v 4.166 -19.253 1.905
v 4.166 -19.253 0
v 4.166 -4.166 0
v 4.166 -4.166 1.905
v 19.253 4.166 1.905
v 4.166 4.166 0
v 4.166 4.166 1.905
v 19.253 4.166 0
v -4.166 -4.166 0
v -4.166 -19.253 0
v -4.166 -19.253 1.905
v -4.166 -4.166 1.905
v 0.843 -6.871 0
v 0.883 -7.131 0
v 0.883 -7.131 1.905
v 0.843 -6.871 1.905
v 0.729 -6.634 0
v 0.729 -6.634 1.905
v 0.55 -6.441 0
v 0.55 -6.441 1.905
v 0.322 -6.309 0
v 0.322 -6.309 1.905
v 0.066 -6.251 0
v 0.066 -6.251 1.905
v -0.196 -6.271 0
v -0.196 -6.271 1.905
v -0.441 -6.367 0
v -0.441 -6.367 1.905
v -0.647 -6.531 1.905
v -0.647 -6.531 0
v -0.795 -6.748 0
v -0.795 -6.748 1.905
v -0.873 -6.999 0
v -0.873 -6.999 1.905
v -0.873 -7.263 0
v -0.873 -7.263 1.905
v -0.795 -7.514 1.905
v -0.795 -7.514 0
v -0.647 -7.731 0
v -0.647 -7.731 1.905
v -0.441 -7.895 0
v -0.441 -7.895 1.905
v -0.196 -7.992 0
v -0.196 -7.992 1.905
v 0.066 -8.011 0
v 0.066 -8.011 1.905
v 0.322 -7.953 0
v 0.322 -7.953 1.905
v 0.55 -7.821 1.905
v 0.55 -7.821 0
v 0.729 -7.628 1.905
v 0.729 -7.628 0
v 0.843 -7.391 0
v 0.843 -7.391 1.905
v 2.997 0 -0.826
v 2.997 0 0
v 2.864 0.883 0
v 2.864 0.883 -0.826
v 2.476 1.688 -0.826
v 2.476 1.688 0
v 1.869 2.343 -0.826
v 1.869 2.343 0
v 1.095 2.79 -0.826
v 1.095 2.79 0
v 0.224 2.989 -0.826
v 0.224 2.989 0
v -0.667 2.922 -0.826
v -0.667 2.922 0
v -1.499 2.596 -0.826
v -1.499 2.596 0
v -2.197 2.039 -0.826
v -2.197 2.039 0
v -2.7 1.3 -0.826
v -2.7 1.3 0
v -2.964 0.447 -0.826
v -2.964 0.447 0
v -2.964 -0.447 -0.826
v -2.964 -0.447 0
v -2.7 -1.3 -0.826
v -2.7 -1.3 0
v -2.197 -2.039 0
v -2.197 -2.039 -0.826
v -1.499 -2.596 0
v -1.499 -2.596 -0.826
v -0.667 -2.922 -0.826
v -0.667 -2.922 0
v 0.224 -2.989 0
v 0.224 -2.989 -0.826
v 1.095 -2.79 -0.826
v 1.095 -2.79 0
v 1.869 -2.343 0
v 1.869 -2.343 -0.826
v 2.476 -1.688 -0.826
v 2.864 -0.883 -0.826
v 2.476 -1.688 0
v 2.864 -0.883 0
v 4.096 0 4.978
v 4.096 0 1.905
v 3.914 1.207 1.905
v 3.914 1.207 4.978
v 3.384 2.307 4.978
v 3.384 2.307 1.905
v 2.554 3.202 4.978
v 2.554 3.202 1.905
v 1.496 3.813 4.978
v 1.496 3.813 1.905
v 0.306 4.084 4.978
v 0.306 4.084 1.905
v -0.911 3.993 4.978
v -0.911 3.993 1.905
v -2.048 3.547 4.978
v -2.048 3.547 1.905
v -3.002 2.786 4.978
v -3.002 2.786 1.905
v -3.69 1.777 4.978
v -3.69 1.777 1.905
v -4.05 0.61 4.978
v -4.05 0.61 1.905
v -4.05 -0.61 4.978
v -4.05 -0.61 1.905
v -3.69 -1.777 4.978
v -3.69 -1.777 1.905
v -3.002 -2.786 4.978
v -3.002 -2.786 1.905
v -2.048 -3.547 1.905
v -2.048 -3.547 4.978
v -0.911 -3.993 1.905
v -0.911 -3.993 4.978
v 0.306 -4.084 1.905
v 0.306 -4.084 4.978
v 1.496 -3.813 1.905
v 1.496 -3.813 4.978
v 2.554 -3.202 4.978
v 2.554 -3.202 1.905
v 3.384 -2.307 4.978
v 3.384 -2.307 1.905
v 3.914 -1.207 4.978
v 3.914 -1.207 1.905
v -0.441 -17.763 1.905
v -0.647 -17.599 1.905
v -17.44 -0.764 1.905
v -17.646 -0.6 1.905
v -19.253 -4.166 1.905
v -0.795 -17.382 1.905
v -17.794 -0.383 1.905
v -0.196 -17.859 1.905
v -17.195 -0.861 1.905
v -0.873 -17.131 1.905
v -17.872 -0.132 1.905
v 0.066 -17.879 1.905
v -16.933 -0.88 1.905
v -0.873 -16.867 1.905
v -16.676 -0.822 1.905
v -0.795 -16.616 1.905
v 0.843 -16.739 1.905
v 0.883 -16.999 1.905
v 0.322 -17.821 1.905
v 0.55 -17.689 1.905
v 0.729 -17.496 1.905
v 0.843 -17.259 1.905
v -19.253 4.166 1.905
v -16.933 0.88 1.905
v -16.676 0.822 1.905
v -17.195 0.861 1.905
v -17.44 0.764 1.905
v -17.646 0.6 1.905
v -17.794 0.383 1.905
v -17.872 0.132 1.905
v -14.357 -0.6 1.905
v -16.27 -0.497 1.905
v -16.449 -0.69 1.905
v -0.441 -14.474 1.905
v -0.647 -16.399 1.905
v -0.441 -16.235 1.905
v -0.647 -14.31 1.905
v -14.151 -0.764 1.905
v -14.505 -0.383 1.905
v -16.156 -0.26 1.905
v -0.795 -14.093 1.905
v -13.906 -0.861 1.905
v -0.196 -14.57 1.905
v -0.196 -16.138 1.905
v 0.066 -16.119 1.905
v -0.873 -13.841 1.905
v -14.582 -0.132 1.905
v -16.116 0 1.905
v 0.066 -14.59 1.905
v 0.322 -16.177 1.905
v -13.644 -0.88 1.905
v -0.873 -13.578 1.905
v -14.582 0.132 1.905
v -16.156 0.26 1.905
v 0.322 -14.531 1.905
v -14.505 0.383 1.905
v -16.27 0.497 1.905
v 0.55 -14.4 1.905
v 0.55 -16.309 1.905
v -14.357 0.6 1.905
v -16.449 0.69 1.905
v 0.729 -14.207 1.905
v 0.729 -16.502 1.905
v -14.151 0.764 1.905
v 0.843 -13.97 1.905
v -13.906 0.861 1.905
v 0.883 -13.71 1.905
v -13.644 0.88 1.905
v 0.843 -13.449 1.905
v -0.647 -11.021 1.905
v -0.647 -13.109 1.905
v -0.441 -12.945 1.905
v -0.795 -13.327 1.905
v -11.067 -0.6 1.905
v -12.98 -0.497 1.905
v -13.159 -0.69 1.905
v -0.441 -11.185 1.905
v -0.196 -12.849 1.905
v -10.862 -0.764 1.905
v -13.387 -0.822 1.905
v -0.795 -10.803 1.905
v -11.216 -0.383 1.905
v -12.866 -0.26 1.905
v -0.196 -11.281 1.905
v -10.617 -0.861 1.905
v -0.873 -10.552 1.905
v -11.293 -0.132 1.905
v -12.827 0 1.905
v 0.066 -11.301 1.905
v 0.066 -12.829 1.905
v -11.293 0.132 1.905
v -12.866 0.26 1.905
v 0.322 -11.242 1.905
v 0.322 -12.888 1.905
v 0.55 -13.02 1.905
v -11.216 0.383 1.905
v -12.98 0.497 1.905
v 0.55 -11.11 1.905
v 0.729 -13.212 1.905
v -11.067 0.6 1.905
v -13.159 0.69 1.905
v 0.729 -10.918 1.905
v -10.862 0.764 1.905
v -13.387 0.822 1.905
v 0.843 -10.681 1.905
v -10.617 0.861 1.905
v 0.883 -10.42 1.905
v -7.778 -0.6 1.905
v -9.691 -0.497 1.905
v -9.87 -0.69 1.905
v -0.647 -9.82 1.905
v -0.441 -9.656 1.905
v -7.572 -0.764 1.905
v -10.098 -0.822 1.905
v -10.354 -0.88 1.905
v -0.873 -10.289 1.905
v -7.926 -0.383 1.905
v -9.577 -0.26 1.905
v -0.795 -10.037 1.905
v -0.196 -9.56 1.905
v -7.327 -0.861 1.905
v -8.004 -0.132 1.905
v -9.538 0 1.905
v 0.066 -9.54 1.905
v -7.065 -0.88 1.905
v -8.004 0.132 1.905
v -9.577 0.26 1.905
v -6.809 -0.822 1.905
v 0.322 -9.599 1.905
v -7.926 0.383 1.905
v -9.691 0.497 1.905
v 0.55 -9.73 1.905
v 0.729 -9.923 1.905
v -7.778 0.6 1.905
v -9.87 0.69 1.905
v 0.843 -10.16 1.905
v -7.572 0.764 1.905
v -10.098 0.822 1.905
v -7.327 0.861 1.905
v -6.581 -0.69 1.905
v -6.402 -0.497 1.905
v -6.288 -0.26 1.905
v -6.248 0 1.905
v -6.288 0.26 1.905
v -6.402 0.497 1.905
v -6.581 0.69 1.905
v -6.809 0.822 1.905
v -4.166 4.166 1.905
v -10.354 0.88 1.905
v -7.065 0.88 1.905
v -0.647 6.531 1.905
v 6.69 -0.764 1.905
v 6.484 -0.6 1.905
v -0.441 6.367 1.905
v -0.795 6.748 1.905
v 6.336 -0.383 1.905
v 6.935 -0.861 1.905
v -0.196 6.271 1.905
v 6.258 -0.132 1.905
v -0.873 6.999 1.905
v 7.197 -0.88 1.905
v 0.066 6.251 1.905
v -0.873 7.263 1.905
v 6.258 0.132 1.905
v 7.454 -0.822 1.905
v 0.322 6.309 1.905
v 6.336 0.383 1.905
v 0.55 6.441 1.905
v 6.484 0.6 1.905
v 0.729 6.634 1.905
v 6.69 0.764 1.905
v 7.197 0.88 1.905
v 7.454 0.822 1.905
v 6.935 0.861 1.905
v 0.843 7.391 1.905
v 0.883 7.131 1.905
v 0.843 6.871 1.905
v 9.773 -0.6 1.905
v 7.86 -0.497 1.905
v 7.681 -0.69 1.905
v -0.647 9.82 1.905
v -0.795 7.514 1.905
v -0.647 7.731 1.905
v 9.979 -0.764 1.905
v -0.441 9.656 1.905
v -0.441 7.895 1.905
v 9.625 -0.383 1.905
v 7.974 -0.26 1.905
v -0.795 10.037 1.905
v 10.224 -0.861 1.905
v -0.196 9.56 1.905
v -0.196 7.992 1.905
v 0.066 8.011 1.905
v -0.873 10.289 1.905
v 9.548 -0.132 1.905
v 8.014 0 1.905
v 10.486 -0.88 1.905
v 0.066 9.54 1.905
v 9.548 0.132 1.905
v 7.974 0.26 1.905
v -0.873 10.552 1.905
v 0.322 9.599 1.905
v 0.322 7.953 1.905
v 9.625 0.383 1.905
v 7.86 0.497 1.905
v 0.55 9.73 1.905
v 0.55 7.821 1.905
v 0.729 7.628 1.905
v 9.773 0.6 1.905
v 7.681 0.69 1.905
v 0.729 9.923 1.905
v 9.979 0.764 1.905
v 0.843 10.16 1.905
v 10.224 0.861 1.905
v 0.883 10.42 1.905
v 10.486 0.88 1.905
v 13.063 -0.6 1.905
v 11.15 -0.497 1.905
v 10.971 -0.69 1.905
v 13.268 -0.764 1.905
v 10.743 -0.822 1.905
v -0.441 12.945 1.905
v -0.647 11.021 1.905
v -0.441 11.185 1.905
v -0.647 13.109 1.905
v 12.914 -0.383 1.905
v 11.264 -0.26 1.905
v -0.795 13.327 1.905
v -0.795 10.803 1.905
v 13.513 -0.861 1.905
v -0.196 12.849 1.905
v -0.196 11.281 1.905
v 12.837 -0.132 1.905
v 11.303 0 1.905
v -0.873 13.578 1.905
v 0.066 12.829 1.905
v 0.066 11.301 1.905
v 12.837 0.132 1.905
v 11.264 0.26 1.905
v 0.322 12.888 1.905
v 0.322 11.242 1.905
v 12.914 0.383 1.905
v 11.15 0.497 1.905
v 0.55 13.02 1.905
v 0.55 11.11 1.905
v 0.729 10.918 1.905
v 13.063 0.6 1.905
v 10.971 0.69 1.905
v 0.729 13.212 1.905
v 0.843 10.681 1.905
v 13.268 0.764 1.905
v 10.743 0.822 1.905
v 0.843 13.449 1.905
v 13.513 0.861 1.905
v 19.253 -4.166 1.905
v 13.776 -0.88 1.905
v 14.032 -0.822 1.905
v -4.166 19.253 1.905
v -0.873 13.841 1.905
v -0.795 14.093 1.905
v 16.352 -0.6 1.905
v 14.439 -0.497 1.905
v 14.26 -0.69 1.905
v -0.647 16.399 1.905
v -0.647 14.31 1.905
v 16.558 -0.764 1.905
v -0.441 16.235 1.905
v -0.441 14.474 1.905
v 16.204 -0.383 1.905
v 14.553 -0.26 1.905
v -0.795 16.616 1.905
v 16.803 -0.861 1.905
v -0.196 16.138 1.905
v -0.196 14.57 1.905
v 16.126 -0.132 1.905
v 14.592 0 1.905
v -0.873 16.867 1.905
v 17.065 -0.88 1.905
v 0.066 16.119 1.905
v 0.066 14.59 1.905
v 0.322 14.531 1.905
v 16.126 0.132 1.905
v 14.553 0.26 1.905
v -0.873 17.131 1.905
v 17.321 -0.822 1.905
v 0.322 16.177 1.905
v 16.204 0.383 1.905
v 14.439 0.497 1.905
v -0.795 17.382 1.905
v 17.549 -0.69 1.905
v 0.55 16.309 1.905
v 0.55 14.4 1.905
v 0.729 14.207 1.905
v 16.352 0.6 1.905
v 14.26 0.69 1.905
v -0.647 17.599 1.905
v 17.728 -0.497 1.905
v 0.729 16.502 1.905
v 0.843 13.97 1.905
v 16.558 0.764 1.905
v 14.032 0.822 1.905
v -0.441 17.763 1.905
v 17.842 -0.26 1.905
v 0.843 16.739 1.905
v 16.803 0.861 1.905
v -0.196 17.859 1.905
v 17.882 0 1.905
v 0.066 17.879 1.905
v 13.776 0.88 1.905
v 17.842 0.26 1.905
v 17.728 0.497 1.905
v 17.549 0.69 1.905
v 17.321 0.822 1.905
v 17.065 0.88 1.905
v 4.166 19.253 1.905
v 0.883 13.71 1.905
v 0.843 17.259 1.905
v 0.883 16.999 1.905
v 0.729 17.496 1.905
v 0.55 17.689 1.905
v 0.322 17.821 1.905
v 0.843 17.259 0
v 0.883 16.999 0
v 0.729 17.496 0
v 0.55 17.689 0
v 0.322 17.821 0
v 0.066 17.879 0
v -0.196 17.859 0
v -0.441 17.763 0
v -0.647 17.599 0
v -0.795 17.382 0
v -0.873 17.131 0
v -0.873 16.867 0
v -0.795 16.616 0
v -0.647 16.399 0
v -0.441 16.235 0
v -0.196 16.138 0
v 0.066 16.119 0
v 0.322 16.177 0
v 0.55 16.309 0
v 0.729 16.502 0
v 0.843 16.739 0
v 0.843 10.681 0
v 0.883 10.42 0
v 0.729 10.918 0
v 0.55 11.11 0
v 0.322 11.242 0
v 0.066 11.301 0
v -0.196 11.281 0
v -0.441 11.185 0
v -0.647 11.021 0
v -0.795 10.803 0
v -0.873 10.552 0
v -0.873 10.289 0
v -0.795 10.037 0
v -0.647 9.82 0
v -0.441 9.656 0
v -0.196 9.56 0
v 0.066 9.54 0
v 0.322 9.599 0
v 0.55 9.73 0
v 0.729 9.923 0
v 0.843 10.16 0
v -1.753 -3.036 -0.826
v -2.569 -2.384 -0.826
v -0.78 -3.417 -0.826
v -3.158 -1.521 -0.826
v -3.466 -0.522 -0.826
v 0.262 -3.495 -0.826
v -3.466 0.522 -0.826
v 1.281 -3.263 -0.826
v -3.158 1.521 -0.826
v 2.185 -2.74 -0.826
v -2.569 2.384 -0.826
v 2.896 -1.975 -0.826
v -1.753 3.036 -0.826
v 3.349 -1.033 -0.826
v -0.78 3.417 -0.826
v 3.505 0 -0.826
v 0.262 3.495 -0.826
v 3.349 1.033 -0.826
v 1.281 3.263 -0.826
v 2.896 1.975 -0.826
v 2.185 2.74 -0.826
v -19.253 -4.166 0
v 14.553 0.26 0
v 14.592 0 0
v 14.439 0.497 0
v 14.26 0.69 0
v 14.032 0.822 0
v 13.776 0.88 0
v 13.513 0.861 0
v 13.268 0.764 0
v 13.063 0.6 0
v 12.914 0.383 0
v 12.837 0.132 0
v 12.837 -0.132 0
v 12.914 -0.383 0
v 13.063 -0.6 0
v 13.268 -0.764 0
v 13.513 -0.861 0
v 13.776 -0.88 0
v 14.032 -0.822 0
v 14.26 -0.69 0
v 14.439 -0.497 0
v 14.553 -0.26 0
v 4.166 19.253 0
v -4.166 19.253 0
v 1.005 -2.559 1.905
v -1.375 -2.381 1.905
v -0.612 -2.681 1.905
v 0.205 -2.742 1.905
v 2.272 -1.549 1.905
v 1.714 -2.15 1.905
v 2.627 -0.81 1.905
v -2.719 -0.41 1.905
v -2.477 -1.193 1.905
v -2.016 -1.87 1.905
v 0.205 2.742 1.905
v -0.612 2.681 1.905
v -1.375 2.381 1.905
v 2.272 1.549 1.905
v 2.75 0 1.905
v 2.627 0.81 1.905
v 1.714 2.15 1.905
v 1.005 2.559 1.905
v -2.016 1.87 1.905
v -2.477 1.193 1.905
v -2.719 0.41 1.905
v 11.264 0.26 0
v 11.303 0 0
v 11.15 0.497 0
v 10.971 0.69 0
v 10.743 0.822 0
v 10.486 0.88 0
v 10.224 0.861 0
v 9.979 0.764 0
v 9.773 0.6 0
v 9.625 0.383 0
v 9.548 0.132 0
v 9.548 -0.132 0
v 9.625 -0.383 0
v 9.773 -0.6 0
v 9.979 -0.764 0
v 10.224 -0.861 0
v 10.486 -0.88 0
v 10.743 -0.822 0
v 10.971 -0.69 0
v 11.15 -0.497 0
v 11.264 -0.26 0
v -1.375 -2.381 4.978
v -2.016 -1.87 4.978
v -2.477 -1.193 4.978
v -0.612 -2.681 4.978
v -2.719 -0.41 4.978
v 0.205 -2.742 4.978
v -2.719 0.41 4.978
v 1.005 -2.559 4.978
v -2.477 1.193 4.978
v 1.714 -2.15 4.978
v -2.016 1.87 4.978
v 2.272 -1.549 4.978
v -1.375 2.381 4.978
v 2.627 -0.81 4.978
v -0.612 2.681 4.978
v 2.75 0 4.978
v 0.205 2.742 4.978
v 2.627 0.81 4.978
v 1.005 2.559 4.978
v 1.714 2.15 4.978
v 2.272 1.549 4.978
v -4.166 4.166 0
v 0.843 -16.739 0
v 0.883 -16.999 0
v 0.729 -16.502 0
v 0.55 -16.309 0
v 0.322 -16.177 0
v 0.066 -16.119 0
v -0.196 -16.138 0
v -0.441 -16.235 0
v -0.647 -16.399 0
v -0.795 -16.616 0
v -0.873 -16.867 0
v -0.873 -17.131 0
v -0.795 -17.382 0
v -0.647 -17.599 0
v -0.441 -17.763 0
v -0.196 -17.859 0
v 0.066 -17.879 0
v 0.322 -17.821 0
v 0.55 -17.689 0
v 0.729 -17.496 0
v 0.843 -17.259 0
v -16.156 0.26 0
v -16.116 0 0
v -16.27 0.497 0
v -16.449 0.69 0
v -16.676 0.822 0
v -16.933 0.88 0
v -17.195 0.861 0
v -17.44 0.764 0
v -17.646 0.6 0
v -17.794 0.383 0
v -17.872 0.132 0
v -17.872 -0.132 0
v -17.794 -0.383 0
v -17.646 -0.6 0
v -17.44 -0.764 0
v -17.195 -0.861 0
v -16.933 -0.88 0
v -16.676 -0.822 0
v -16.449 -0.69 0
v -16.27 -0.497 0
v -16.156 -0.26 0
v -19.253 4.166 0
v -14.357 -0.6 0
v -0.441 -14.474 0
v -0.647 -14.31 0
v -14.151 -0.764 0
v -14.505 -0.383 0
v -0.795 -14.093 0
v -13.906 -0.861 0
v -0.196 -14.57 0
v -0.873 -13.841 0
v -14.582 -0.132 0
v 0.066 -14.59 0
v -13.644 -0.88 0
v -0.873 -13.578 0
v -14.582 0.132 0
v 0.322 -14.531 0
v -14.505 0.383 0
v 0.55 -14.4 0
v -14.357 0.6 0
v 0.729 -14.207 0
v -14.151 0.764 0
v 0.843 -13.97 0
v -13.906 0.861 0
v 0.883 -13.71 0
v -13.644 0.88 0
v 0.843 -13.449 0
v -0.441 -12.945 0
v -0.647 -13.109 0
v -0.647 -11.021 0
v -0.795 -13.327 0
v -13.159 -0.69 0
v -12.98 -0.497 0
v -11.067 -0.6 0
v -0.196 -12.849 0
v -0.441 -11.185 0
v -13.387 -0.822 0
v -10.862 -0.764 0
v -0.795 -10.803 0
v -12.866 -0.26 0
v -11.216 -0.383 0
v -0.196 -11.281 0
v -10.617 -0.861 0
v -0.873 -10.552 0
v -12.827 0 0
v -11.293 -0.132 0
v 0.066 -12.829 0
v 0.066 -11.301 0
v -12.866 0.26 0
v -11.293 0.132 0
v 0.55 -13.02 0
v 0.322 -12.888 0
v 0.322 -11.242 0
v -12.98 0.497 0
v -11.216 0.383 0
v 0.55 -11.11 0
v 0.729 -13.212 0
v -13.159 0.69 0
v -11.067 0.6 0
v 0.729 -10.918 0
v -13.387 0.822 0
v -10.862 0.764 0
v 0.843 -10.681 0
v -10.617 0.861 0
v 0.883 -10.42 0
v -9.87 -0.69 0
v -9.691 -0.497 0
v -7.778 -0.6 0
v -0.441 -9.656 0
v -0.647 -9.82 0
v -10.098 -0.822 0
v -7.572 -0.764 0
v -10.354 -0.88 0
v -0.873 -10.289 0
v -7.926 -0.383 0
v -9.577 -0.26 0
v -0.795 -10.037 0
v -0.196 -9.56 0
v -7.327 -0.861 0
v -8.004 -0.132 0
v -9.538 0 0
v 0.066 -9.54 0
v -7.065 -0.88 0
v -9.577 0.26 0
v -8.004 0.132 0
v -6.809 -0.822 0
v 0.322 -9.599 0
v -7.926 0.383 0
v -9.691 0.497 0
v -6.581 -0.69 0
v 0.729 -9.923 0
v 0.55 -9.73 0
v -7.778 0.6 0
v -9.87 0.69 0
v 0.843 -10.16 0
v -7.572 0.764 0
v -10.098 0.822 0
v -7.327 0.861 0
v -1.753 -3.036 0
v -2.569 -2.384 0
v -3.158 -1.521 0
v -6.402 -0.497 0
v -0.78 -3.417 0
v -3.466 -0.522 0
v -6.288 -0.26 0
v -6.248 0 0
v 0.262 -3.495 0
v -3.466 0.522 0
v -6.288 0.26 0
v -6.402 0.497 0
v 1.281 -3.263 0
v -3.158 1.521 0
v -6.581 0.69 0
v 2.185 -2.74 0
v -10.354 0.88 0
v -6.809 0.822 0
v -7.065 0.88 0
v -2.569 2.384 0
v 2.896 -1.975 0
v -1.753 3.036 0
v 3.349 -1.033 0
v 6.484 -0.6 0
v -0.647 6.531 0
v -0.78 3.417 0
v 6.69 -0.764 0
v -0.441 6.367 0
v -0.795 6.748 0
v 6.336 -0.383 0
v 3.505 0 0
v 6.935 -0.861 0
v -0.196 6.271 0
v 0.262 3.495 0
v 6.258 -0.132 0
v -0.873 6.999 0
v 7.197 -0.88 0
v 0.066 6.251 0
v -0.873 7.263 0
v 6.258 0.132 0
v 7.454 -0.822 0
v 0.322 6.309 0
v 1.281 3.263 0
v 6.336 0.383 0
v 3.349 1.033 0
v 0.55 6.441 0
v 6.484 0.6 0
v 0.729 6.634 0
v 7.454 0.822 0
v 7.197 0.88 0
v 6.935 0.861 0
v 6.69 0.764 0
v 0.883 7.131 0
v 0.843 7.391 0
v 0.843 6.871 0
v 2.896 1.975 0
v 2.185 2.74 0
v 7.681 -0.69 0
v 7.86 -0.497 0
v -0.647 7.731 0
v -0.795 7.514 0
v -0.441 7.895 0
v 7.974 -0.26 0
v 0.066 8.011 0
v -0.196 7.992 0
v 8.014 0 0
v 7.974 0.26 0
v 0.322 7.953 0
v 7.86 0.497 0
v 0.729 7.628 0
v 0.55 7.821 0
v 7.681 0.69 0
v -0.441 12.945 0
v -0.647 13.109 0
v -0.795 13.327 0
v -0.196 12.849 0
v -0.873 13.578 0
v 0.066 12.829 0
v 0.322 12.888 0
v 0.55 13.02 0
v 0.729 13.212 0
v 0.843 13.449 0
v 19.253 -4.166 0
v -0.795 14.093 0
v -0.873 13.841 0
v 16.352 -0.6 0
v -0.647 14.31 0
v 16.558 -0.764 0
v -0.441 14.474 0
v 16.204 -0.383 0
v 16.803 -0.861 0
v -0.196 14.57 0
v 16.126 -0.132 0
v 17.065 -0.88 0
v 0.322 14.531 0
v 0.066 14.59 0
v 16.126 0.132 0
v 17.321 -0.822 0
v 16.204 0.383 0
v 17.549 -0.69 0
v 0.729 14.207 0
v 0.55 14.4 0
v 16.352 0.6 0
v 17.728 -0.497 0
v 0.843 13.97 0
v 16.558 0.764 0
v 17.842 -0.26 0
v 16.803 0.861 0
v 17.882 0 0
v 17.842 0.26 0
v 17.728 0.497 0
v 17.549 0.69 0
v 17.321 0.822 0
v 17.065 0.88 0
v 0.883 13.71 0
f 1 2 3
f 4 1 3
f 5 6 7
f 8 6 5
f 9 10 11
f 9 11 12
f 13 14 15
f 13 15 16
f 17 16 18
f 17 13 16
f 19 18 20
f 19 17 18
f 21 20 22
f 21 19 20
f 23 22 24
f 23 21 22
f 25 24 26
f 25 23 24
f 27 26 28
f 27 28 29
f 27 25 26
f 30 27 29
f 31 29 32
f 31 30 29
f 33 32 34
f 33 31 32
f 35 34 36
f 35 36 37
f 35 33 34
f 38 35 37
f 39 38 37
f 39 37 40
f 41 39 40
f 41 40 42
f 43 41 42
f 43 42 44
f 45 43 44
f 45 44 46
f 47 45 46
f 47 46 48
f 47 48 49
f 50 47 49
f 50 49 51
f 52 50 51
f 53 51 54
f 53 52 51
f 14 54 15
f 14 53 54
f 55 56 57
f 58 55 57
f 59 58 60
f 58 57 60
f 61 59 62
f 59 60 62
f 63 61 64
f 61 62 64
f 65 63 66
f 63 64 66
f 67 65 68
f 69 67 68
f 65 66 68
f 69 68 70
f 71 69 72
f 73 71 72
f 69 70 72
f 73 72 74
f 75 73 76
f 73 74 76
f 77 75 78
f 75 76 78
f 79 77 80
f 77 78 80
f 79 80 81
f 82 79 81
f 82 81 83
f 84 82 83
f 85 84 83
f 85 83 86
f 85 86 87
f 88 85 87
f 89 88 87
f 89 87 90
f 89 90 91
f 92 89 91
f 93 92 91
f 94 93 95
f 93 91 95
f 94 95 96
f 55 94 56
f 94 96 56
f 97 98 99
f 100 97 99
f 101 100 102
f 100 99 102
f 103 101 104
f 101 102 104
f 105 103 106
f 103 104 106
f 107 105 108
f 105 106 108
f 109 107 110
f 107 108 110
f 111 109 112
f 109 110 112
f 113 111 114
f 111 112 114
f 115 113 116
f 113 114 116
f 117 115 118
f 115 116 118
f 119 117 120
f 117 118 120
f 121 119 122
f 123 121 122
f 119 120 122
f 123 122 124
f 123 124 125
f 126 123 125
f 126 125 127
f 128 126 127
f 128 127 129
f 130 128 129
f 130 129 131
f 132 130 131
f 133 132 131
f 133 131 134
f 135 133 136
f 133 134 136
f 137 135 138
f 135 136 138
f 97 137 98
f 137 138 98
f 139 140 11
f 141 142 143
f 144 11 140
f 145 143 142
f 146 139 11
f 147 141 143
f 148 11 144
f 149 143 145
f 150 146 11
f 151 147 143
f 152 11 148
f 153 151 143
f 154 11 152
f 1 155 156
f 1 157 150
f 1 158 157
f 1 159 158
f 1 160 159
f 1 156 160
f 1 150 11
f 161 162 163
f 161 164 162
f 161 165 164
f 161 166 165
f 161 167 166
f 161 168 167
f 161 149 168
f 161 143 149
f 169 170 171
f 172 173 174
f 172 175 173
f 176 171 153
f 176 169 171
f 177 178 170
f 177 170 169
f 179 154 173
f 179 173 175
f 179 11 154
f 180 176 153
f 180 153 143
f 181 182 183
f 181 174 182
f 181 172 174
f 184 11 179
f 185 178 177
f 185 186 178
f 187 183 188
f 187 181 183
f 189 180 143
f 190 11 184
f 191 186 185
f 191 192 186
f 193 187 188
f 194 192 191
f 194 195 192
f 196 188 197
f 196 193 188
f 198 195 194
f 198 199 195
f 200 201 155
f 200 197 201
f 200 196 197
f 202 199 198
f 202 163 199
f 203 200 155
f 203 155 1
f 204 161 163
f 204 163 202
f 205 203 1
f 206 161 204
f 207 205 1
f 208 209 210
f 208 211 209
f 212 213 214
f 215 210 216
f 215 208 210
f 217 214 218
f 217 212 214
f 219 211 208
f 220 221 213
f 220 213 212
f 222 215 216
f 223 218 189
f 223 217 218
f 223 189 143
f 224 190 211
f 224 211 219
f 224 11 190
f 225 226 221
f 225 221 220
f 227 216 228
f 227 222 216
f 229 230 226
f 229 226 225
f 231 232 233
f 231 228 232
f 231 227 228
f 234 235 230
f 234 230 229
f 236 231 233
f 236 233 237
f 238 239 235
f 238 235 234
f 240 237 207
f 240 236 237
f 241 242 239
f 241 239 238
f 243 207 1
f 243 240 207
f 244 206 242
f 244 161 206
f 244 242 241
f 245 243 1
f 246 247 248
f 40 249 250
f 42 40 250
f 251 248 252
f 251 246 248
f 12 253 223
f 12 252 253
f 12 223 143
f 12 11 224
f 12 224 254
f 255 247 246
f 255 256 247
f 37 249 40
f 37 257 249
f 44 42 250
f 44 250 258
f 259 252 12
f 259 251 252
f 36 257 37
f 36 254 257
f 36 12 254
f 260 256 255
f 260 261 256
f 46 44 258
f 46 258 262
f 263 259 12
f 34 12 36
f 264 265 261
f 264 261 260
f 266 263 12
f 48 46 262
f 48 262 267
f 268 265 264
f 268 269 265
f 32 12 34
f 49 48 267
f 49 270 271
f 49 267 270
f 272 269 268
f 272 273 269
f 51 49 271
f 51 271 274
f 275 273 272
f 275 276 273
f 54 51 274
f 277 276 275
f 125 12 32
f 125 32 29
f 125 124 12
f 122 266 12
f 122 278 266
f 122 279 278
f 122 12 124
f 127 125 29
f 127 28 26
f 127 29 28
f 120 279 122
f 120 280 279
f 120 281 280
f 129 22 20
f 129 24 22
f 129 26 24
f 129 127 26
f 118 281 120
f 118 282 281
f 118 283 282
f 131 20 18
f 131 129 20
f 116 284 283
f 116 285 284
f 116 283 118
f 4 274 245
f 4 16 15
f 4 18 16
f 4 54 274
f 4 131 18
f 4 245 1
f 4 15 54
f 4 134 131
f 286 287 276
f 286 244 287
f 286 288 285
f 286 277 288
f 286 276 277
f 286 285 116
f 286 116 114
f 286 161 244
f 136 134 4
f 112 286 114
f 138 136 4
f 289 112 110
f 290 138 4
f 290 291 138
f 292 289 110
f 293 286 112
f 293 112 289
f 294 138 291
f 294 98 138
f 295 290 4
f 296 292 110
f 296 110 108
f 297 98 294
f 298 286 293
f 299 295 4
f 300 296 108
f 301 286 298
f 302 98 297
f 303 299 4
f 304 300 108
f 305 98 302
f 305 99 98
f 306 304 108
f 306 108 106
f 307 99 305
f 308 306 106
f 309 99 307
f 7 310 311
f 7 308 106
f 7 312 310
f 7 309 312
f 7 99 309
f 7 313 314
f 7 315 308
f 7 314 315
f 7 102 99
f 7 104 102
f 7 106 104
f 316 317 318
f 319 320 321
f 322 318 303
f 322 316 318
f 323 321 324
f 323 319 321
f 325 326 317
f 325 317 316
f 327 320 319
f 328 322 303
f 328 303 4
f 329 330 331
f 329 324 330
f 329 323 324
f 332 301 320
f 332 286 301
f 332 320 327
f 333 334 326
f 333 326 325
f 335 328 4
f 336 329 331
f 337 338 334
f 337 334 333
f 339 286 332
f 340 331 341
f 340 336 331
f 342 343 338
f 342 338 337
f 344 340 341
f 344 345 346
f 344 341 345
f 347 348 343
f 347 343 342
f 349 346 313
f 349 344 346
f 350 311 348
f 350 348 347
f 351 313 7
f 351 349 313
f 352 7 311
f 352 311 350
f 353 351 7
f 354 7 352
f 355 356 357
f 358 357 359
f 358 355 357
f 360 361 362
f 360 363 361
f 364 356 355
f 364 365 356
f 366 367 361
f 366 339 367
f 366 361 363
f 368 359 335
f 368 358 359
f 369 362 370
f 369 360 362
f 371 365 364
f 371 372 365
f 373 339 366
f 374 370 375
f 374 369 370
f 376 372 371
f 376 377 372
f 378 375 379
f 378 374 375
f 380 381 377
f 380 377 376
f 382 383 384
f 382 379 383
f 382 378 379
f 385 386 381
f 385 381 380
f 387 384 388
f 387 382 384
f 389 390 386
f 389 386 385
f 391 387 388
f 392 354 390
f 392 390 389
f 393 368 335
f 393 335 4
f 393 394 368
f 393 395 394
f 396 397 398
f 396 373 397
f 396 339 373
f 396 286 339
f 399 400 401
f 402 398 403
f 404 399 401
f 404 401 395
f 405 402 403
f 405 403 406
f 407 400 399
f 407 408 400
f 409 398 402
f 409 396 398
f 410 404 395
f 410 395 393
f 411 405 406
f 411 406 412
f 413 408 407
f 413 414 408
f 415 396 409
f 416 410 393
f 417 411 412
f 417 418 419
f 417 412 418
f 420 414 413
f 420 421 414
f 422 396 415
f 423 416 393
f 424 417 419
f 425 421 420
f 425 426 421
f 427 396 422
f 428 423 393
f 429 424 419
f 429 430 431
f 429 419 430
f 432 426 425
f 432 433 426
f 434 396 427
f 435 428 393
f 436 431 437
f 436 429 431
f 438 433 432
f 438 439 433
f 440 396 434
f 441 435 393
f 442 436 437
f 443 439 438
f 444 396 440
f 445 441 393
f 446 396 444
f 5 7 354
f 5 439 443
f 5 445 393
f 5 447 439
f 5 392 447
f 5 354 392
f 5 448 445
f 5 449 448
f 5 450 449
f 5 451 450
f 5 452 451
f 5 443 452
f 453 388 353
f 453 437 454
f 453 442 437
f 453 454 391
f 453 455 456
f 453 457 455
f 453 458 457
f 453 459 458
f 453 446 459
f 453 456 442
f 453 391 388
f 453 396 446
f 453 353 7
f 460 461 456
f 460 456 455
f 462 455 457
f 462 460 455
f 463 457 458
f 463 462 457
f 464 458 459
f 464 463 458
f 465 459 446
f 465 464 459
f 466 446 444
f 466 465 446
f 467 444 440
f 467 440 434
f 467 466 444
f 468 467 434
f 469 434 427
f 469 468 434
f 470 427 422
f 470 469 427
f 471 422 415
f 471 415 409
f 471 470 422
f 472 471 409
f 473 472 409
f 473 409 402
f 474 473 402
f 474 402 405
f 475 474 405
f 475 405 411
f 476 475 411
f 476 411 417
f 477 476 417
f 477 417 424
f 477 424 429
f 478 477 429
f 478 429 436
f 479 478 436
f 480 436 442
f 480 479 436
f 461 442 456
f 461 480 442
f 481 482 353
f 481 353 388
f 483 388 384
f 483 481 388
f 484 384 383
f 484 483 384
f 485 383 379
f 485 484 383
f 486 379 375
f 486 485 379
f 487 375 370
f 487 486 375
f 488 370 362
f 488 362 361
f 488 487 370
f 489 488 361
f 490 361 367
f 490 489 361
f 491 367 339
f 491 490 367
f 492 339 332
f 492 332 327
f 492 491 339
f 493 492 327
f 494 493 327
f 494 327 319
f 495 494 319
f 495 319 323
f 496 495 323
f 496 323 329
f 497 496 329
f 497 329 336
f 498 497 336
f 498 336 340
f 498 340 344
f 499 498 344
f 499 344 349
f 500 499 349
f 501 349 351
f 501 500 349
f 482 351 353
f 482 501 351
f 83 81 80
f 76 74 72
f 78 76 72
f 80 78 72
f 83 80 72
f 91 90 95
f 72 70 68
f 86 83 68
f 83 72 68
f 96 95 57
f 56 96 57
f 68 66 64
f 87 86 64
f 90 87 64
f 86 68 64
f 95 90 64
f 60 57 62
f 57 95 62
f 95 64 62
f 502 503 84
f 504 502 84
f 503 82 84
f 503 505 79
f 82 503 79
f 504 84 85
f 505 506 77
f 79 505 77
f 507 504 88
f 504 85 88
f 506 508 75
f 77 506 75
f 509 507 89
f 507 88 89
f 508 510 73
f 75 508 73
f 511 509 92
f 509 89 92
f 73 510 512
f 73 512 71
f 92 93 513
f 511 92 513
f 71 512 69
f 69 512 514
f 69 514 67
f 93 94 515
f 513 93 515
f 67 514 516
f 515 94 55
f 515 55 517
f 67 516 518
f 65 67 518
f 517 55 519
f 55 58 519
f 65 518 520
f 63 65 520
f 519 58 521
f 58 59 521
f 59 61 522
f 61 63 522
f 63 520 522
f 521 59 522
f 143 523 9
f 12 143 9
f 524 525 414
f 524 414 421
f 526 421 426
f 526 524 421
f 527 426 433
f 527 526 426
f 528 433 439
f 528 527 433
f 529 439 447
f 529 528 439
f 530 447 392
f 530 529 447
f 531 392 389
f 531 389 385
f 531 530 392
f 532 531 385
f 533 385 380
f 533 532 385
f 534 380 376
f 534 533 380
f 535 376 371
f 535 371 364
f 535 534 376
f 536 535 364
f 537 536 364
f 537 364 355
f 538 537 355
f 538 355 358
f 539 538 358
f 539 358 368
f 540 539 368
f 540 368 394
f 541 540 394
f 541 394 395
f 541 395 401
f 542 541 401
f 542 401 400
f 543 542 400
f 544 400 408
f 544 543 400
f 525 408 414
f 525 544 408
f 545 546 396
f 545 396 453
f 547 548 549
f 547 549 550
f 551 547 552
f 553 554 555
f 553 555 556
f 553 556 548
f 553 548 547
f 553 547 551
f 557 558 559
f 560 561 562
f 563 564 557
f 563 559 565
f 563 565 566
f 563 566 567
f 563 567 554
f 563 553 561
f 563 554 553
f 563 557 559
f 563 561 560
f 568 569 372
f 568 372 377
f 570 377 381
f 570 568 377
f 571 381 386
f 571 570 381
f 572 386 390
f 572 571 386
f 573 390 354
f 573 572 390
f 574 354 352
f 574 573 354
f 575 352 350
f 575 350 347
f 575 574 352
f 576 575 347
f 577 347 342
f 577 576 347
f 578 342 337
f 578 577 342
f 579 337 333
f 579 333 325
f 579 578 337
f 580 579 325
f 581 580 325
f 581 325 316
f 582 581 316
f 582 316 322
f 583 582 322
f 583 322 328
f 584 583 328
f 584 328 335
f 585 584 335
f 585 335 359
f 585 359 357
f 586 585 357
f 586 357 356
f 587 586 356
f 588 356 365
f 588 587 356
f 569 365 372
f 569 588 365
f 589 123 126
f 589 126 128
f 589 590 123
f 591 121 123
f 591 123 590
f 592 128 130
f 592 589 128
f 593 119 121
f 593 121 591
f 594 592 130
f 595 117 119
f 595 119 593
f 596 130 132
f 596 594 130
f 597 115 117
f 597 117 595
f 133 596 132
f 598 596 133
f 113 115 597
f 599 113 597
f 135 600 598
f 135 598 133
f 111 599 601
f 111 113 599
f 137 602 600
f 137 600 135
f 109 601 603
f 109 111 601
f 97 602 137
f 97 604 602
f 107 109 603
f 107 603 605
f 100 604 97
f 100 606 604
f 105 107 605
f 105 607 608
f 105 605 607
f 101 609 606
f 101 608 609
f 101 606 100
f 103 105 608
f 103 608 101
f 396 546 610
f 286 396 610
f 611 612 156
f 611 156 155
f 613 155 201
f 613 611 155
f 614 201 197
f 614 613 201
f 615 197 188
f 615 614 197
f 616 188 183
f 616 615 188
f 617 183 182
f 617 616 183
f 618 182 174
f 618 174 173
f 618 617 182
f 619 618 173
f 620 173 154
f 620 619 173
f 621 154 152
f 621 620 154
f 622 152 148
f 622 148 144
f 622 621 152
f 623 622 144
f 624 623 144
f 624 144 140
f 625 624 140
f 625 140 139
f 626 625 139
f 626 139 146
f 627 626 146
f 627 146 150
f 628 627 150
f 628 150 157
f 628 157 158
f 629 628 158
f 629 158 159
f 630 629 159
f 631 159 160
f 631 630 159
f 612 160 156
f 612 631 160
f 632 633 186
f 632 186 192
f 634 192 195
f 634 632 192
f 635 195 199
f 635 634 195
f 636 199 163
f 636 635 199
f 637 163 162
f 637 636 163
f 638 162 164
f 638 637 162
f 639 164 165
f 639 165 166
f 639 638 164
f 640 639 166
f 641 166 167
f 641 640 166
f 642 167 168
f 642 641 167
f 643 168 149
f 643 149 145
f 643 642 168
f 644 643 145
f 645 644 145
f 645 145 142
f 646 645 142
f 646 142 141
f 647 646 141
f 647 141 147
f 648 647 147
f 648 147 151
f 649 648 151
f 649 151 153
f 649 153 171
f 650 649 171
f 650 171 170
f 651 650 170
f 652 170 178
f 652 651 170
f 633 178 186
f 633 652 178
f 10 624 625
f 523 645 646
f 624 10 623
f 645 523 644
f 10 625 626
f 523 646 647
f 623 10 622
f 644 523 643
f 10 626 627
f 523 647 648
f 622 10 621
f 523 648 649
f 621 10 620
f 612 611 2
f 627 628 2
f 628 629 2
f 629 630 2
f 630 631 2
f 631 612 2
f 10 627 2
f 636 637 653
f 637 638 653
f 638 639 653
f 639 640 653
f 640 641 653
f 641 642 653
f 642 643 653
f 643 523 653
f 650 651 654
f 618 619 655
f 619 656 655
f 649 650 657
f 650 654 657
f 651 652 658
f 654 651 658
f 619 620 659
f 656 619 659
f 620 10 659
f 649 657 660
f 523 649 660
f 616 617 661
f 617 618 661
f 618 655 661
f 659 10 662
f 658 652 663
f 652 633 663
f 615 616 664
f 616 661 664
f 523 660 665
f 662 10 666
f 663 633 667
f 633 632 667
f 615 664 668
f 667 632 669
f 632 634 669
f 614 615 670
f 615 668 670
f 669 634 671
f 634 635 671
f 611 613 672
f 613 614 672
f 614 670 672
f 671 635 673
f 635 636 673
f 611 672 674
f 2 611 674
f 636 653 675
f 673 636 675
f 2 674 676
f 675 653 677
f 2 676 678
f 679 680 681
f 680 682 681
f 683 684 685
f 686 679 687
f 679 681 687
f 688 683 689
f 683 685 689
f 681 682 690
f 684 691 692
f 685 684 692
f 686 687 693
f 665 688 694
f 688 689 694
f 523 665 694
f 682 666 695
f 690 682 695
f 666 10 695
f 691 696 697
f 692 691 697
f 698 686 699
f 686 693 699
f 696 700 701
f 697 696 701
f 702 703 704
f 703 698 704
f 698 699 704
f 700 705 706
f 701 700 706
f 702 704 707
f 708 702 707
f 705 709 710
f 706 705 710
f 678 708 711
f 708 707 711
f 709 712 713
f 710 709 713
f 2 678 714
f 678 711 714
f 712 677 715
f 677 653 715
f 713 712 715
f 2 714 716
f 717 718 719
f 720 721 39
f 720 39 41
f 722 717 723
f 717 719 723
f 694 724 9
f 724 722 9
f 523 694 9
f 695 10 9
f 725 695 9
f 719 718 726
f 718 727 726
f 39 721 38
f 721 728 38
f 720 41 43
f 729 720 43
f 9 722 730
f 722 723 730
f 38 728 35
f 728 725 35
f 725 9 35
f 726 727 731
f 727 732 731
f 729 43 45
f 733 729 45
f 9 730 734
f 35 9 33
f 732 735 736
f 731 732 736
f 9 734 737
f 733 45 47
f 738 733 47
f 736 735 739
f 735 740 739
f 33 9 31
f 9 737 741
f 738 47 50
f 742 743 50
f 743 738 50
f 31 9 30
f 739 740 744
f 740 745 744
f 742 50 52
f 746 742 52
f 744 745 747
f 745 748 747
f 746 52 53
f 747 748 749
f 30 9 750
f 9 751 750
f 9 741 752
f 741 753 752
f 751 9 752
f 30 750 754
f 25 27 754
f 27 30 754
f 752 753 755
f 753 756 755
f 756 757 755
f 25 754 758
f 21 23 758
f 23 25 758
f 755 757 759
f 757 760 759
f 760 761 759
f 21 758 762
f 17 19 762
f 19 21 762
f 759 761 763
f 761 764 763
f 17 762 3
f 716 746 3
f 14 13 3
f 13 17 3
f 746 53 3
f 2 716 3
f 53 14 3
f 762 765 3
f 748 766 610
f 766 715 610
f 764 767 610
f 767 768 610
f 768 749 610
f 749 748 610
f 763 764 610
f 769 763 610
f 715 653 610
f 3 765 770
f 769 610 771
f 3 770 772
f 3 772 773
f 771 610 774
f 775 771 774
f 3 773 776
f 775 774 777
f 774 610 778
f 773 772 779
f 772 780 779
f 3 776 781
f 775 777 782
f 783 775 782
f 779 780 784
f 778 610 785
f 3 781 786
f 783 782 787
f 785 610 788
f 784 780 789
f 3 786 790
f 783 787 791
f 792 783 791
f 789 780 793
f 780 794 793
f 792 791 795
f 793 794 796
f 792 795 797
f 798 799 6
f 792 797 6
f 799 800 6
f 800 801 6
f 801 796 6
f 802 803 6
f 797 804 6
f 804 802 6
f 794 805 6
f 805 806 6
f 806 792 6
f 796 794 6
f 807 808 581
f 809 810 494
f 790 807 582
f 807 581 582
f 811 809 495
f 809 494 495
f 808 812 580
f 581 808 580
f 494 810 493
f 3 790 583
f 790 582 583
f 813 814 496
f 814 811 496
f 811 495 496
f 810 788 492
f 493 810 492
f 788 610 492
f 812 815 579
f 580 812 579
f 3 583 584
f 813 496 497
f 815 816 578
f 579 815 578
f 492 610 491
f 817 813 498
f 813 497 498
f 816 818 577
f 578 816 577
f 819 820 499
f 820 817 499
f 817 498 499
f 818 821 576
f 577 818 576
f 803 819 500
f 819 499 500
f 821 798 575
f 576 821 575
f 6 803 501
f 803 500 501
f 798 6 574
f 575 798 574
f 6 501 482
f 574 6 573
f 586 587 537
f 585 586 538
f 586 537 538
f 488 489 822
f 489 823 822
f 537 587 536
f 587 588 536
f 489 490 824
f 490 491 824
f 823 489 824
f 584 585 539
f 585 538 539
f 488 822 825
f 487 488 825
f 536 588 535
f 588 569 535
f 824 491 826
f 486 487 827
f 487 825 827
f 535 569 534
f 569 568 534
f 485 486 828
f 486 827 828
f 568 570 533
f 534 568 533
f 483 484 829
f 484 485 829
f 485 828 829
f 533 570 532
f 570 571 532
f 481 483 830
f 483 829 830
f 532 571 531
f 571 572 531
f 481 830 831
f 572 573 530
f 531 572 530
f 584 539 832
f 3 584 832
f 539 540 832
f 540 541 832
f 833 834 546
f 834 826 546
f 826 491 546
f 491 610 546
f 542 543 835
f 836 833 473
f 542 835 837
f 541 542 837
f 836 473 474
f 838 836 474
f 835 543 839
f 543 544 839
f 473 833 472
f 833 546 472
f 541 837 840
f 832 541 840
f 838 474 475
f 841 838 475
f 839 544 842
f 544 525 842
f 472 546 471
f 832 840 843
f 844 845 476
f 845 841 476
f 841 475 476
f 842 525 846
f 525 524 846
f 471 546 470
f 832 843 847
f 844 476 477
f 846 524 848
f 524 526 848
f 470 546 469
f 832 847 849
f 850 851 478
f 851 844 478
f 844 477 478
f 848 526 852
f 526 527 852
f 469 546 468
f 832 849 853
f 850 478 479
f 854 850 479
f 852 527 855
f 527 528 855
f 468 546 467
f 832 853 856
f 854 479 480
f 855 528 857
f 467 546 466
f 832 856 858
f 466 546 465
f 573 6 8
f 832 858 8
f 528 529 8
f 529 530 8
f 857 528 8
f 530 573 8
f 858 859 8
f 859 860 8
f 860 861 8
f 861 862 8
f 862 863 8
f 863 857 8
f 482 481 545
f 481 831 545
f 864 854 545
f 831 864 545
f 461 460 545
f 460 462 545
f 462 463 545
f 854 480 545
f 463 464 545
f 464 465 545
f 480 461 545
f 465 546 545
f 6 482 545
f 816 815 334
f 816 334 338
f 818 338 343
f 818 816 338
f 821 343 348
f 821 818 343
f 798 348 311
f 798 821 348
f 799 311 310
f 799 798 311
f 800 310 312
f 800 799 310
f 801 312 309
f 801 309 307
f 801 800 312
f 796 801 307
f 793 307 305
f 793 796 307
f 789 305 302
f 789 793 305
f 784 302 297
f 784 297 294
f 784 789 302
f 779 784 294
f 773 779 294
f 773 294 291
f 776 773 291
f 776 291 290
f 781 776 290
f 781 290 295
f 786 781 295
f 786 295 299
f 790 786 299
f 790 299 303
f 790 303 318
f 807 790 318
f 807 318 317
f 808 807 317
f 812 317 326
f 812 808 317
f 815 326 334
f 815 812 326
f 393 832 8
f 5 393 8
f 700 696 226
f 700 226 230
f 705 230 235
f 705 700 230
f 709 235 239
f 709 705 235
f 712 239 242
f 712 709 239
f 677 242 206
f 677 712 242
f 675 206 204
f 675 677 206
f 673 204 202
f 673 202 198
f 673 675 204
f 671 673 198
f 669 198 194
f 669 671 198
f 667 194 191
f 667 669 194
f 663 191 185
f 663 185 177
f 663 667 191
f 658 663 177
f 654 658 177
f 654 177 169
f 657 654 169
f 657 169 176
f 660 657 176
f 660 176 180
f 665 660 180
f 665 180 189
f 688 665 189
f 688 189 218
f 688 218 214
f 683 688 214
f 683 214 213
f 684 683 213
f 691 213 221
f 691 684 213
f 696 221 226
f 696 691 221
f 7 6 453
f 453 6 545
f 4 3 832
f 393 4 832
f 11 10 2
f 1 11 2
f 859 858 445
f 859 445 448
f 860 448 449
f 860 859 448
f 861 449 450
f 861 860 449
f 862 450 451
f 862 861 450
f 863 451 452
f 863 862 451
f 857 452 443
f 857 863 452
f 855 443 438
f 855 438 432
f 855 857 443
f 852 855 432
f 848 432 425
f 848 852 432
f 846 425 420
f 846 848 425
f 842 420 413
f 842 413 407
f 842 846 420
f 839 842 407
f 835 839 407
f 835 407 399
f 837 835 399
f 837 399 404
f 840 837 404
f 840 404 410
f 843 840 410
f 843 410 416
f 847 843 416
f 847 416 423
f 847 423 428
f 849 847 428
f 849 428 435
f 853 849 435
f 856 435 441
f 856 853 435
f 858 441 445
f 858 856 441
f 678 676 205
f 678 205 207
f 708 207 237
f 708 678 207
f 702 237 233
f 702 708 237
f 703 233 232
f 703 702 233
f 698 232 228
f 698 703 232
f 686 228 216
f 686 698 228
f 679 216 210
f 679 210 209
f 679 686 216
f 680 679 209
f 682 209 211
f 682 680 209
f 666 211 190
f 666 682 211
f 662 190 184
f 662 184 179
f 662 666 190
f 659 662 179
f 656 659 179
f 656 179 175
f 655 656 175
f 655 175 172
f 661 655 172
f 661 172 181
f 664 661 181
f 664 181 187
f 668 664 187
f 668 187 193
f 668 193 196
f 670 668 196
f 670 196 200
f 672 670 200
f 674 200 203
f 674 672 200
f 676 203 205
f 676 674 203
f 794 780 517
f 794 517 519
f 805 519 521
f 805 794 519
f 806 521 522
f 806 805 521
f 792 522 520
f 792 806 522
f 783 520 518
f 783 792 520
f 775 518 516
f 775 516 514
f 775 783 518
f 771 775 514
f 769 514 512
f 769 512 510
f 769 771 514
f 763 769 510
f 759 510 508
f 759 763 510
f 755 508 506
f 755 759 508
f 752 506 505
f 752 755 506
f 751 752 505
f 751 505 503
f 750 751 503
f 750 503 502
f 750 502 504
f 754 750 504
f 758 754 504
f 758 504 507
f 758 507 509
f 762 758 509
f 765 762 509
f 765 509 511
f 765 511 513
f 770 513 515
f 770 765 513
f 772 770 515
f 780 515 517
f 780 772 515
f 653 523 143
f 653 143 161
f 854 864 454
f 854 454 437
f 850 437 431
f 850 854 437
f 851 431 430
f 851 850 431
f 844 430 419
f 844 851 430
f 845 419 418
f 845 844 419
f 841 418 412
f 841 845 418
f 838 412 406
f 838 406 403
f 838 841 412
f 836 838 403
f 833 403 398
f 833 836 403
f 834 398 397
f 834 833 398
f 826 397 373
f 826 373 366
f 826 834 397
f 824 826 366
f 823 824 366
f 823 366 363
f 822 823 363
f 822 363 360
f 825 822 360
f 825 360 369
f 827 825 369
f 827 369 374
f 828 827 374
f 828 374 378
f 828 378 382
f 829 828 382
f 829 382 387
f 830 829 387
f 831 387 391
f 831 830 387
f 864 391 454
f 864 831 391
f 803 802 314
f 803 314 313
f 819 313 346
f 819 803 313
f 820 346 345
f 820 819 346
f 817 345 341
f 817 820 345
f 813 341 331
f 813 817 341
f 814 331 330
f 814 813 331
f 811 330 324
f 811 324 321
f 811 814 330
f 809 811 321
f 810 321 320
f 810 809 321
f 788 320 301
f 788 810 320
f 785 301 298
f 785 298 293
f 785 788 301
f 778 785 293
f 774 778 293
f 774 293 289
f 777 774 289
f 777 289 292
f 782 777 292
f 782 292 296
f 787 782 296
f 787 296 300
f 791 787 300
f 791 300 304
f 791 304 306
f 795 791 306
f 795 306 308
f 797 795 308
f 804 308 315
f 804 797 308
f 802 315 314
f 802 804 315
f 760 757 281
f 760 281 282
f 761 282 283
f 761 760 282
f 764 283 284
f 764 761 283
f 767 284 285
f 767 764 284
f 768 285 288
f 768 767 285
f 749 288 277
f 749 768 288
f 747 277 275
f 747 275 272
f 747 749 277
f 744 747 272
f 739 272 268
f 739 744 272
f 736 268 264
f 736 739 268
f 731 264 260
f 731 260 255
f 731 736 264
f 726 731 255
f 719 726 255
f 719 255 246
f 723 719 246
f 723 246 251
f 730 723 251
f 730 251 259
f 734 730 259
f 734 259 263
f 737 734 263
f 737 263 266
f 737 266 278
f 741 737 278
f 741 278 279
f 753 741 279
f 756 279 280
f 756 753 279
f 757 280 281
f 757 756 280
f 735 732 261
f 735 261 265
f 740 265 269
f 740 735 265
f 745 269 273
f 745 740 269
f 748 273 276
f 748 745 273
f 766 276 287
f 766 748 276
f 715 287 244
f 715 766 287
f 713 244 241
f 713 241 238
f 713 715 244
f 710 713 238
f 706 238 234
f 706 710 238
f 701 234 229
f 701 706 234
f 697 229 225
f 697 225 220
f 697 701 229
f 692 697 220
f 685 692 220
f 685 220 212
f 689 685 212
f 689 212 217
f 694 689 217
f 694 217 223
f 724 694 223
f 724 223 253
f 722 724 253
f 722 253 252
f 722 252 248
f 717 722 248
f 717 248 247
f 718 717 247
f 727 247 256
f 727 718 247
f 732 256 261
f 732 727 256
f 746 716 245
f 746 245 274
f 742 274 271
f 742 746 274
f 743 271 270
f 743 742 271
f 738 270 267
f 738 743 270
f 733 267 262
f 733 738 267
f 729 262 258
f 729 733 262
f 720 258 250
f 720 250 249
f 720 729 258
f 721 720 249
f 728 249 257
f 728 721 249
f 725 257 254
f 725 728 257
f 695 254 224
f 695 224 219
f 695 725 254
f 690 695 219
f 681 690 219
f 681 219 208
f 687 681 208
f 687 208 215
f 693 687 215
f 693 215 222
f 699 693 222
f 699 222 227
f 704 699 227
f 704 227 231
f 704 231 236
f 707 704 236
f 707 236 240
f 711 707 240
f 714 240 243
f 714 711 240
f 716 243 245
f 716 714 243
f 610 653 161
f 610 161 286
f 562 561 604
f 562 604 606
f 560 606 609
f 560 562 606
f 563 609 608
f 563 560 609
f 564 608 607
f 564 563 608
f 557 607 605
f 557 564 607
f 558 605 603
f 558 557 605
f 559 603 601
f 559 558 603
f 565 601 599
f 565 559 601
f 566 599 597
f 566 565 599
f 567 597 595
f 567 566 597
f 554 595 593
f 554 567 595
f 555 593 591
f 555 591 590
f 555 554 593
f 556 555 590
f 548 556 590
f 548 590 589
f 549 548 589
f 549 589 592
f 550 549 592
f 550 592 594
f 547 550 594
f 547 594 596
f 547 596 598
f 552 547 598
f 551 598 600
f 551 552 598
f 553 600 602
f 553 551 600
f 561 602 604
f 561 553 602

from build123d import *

# Parameters (mm, degrees)
F0_W     = 8.3312
F0_H     = 15.0876
F0_R     = 0.88265
F0_W_2   = 15.0876
F0_H_2   = 8.3312
F0_R_2   = 4.09575
F0_R_3   = 2.74955
F1_DEPTH = 1.905
F2_R     = 4.09575
F2_R_2   = 2.74955
F3_DEPTH = 3.0734
F4_R     = 3.5052
F4_R_2   = 2.9972
F5_DEPTH = 0.8255


with BuildPart() as f1:
    # F0 (on Top) → F1 (new body)
    with BuildSketch(Plane.XY):
        with Locations((0, 11.7094)):
            Rectangle(F0_W, F0_H)
        with Locations((0, 7.13105)):
            Circle(F0_R, mode=Mode.SUBTRACT)
        with Locations((0, 10.42035)):
            Circle(F0_R, mode=Mode.SUBTRACT)
        with Locations((0, 13.70965)):
            Circle(F0_R, mode=Mode.SUBTRACT)
        with Locations((0, 16.99895)):
            Circle(F0_R, mode=Mode.SUBTRACT)
        with Locations((11.7094, 0)):
            Rectangle(F0_W_2, F0_H_2)
        with Locations((7.13105, 0)):
            Circle(F0_R, mode=Mode.SUBTRACT)
        with Locations((10.42035, 0)):
            Circle(F0_R, mode=Mode.SUBTRACT)
        with Locations((13.70965, 0)):
            Circle(F0_R, mode=Mode.SUBTRACT)
        with Locations((16.99895, 0)):
            Circle(F0_R, mode=Mode.SUBTRACT)
        Rectangle(F0_W, F0_H_2)
        Circle(F0_R_2, mode=Mode.SUBTRACT)
        with Locations((-11.7094, 0)):
            Rectangle(F0_W_2, F0_H_2)
        with Locations((-16.99895, 0)):
            Circle(F0_R, mode=Mode.SUBTRACT)
        with Locations((-13.70965, 0)):
            Circle(F0_R, mode=Mode.SUBTRACT)
        with Locations((-10.42035, 0)):
            Circle(F0_R, mode=Mode.SUBTRACT)
        with Locations((-7.13105, 0)):
            Circle(F0_R, mode=Mode.SUBTRACT)
        with Locations((0, -11.7094)):
            Rectangle(F0_W, F0_H)
        with Locations((0, -16.99895)):
            Circle(F0_R, mode=Mode.SUBTRACT)
        with Locations((0, -13.70965)):
            Circle(F0_R, mode=Mode.SUBTRACT)
        with Locations((0, -10.42035)):
            Circle(F0_R, mode=Mode.SUBTRACT)
        with Locations((0, -7.13105)):
            Circle(F0_R, mode=Mode.SUBTRACT)
        Circle(F0_R_2)
        Circle(F0_R_3, mode=Mode.SUBTRACT)
        Circle(F0_R_3)
    extrude(amount=F1_DEPTH)

    # F2 (on face) → F3 (join)
    with BuildSketch(Plane.XY.offset(1.905)):
        Circle(F2_R)
        Circle(F2_R_2, mode=Mode.SUBTRACT)
    extrude(amount=F3_DEPTH)

    # F4 (on face) → F5 (join)
    with BuildSketch(Plane.XY):
        Circle(F4_R)
        Circle(F4_R_2, mode=Mode.SUBTRACT)
    extrude(amount=-F5_DEPTH)


solid = f1.part
